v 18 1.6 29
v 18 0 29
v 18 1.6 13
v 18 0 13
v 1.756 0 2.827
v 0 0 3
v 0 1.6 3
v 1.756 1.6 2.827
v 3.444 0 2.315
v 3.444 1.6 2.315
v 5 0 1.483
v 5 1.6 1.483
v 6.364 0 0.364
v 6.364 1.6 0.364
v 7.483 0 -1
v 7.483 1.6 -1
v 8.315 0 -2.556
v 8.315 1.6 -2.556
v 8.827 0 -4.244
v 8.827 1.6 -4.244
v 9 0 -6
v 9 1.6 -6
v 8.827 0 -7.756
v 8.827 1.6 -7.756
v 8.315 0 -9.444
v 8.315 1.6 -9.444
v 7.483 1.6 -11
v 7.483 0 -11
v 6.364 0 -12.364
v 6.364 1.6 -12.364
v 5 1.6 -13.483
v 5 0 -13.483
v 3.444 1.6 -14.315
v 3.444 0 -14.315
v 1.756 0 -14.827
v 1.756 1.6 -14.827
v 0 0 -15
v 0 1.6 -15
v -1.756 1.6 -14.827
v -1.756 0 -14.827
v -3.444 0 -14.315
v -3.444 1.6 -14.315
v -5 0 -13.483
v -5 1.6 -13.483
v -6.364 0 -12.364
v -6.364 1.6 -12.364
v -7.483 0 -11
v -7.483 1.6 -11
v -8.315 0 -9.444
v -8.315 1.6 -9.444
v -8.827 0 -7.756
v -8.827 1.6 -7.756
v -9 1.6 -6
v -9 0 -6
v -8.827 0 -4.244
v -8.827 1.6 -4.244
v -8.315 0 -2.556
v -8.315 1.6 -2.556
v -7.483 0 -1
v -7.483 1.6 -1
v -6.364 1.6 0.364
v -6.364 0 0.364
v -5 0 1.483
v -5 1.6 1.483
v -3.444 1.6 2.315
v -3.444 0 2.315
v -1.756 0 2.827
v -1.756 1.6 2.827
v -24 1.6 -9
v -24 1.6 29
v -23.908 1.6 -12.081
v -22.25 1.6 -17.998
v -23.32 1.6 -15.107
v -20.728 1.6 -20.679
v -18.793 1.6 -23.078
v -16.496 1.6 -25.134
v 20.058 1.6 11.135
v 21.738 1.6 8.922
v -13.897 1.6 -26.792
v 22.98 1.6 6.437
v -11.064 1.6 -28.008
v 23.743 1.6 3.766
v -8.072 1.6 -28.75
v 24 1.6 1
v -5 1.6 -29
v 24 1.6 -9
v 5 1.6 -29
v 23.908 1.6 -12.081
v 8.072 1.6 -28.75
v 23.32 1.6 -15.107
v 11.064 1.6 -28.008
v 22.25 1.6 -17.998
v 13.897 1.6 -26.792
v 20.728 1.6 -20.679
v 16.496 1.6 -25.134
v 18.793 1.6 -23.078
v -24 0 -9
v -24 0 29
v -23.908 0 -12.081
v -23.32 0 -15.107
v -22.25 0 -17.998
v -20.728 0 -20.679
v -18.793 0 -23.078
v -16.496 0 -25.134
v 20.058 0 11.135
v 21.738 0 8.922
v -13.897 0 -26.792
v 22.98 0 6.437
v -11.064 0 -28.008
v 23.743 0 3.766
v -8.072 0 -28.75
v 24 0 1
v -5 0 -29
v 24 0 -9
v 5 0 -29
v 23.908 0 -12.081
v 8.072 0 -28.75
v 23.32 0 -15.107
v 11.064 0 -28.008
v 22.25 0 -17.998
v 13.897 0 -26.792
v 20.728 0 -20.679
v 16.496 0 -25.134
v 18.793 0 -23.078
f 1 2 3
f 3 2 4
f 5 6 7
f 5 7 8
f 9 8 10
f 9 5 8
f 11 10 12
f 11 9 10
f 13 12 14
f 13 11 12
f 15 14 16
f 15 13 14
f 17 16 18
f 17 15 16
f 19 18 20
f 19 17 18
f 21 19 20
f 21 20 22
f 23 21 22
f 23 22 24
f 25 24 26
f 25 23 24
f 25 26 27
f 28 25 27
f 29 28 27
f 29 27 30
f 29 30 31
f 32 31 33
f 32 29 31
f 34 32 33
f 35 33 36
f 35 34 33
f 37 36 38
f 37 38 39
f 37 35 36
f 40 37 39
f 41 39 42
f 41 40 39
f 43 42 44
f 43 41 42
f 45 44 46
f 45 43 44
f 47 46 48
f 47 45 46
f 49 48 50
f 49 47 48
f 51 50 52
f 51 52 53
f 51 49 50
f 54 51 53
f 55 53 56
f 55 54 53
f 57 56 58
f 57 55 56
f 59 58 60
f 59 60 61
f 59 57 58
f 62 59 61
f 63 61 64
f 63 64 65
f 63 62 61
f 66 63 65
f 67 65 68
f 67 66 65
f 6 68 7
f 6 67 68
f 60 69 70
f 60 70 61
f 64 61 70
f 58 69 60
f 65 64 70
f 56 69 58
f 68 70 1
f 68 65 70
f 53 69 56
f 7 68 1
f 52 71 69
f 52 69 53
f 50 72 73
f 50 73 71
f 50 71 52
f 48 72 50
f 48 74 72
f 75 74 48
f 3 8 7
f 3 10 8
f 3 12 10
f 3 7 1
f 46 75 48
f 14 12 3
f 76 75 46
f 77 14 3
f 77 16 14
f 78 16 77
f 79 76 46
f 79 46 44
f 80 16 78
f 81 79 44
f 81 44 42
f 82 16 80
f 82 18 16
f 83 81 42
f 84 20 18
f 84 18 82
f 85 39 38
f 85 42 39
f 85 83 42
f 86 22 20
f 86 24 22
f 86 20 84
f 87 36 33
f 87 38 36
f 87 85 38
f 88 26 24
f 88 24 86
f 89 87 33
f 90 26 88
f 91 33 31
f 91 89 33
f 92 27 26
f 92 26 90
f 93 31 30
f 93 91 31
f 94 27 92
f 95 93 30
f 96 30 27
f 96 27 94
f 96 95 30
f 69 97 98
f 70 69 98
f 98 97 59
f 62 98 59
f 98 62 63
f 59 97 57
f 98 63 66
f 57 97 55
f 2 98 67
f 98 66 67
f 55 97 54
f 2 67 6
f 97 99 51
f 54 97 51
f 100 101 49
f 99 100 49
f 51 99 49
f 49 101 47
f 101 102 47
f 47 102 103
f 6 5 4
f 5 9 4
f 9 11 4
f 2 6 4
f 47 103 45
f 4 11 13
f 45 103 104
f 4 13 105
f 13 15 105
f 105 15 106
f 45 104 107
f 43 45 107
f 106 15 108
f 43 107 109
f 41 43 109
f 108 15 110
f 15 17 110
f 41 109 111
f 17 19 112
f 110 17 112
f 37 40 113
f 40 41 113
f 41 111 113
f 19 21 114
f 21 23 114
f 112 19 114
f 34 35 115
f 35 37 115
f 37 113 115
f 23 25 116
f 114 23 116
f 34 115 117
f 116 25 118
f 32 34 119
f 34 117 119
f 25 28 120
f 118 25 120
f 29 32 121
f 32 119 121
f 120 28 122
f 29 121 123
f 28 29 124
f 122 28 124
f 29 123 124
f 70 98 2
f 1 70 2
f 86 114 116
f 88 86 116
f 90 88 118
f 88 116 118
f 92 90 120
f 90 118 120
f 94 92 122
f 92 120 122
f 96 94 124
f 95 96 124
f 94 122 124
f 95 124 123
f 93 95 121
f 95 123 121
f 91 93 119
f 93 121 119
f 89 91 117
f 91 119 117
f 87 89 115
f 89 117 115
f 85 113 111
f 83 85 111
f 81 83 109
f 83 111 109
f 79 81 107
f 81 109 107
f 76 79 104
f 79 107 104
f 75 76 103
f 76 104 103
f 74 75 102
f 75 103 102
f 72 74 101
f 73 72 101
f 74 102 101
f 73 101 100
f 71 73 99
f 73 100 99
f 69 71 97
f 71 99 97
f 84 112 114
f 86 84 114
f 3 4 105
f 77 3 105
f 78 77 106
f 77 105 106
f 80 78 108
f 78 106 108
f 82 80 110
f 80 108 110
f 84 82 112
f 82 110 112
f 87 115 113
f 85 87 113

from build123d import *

# Parameters (mm, degrees)
ESQUISSE1_R      = 9
EXTRUSION1_DEPTH = 1.6


with BuildPart() as part:
    # Esquisse1 → Extrusion1 (new body)
    with BuildSketch(Plane(origin=(0, 0, 0), x_dir=(1, 0, 0), z_dir=(0, 1, 0))):
        with BuildLine():
            Line((-24, 9), (-24, -29))
            Line((-24, -29), (18, -29))
            Line((18, -29), (18, -13))
            ThreePointArc((18, -13), (22.416407865, -7.708203932), (24, -1))
            Line((24, -1), (24, 9))
            ThreePointArc((24, 9), (18.793114224, 23.078458513), (5, 29))
            Line((5, 29), (-5, 29))
            ThreePointArc((-5, 29), (-18.793114224, 23.078458513), (-24, 9))
        make_face()
        with Locations(Location((0, 6, 0), (0, 0, 270))):
            Circle(ESQUISSE1_R, mode=Mode.SUBTRACT)
    extrude(amount=EXTRUSION1_DEPTH)


solid = part.part
